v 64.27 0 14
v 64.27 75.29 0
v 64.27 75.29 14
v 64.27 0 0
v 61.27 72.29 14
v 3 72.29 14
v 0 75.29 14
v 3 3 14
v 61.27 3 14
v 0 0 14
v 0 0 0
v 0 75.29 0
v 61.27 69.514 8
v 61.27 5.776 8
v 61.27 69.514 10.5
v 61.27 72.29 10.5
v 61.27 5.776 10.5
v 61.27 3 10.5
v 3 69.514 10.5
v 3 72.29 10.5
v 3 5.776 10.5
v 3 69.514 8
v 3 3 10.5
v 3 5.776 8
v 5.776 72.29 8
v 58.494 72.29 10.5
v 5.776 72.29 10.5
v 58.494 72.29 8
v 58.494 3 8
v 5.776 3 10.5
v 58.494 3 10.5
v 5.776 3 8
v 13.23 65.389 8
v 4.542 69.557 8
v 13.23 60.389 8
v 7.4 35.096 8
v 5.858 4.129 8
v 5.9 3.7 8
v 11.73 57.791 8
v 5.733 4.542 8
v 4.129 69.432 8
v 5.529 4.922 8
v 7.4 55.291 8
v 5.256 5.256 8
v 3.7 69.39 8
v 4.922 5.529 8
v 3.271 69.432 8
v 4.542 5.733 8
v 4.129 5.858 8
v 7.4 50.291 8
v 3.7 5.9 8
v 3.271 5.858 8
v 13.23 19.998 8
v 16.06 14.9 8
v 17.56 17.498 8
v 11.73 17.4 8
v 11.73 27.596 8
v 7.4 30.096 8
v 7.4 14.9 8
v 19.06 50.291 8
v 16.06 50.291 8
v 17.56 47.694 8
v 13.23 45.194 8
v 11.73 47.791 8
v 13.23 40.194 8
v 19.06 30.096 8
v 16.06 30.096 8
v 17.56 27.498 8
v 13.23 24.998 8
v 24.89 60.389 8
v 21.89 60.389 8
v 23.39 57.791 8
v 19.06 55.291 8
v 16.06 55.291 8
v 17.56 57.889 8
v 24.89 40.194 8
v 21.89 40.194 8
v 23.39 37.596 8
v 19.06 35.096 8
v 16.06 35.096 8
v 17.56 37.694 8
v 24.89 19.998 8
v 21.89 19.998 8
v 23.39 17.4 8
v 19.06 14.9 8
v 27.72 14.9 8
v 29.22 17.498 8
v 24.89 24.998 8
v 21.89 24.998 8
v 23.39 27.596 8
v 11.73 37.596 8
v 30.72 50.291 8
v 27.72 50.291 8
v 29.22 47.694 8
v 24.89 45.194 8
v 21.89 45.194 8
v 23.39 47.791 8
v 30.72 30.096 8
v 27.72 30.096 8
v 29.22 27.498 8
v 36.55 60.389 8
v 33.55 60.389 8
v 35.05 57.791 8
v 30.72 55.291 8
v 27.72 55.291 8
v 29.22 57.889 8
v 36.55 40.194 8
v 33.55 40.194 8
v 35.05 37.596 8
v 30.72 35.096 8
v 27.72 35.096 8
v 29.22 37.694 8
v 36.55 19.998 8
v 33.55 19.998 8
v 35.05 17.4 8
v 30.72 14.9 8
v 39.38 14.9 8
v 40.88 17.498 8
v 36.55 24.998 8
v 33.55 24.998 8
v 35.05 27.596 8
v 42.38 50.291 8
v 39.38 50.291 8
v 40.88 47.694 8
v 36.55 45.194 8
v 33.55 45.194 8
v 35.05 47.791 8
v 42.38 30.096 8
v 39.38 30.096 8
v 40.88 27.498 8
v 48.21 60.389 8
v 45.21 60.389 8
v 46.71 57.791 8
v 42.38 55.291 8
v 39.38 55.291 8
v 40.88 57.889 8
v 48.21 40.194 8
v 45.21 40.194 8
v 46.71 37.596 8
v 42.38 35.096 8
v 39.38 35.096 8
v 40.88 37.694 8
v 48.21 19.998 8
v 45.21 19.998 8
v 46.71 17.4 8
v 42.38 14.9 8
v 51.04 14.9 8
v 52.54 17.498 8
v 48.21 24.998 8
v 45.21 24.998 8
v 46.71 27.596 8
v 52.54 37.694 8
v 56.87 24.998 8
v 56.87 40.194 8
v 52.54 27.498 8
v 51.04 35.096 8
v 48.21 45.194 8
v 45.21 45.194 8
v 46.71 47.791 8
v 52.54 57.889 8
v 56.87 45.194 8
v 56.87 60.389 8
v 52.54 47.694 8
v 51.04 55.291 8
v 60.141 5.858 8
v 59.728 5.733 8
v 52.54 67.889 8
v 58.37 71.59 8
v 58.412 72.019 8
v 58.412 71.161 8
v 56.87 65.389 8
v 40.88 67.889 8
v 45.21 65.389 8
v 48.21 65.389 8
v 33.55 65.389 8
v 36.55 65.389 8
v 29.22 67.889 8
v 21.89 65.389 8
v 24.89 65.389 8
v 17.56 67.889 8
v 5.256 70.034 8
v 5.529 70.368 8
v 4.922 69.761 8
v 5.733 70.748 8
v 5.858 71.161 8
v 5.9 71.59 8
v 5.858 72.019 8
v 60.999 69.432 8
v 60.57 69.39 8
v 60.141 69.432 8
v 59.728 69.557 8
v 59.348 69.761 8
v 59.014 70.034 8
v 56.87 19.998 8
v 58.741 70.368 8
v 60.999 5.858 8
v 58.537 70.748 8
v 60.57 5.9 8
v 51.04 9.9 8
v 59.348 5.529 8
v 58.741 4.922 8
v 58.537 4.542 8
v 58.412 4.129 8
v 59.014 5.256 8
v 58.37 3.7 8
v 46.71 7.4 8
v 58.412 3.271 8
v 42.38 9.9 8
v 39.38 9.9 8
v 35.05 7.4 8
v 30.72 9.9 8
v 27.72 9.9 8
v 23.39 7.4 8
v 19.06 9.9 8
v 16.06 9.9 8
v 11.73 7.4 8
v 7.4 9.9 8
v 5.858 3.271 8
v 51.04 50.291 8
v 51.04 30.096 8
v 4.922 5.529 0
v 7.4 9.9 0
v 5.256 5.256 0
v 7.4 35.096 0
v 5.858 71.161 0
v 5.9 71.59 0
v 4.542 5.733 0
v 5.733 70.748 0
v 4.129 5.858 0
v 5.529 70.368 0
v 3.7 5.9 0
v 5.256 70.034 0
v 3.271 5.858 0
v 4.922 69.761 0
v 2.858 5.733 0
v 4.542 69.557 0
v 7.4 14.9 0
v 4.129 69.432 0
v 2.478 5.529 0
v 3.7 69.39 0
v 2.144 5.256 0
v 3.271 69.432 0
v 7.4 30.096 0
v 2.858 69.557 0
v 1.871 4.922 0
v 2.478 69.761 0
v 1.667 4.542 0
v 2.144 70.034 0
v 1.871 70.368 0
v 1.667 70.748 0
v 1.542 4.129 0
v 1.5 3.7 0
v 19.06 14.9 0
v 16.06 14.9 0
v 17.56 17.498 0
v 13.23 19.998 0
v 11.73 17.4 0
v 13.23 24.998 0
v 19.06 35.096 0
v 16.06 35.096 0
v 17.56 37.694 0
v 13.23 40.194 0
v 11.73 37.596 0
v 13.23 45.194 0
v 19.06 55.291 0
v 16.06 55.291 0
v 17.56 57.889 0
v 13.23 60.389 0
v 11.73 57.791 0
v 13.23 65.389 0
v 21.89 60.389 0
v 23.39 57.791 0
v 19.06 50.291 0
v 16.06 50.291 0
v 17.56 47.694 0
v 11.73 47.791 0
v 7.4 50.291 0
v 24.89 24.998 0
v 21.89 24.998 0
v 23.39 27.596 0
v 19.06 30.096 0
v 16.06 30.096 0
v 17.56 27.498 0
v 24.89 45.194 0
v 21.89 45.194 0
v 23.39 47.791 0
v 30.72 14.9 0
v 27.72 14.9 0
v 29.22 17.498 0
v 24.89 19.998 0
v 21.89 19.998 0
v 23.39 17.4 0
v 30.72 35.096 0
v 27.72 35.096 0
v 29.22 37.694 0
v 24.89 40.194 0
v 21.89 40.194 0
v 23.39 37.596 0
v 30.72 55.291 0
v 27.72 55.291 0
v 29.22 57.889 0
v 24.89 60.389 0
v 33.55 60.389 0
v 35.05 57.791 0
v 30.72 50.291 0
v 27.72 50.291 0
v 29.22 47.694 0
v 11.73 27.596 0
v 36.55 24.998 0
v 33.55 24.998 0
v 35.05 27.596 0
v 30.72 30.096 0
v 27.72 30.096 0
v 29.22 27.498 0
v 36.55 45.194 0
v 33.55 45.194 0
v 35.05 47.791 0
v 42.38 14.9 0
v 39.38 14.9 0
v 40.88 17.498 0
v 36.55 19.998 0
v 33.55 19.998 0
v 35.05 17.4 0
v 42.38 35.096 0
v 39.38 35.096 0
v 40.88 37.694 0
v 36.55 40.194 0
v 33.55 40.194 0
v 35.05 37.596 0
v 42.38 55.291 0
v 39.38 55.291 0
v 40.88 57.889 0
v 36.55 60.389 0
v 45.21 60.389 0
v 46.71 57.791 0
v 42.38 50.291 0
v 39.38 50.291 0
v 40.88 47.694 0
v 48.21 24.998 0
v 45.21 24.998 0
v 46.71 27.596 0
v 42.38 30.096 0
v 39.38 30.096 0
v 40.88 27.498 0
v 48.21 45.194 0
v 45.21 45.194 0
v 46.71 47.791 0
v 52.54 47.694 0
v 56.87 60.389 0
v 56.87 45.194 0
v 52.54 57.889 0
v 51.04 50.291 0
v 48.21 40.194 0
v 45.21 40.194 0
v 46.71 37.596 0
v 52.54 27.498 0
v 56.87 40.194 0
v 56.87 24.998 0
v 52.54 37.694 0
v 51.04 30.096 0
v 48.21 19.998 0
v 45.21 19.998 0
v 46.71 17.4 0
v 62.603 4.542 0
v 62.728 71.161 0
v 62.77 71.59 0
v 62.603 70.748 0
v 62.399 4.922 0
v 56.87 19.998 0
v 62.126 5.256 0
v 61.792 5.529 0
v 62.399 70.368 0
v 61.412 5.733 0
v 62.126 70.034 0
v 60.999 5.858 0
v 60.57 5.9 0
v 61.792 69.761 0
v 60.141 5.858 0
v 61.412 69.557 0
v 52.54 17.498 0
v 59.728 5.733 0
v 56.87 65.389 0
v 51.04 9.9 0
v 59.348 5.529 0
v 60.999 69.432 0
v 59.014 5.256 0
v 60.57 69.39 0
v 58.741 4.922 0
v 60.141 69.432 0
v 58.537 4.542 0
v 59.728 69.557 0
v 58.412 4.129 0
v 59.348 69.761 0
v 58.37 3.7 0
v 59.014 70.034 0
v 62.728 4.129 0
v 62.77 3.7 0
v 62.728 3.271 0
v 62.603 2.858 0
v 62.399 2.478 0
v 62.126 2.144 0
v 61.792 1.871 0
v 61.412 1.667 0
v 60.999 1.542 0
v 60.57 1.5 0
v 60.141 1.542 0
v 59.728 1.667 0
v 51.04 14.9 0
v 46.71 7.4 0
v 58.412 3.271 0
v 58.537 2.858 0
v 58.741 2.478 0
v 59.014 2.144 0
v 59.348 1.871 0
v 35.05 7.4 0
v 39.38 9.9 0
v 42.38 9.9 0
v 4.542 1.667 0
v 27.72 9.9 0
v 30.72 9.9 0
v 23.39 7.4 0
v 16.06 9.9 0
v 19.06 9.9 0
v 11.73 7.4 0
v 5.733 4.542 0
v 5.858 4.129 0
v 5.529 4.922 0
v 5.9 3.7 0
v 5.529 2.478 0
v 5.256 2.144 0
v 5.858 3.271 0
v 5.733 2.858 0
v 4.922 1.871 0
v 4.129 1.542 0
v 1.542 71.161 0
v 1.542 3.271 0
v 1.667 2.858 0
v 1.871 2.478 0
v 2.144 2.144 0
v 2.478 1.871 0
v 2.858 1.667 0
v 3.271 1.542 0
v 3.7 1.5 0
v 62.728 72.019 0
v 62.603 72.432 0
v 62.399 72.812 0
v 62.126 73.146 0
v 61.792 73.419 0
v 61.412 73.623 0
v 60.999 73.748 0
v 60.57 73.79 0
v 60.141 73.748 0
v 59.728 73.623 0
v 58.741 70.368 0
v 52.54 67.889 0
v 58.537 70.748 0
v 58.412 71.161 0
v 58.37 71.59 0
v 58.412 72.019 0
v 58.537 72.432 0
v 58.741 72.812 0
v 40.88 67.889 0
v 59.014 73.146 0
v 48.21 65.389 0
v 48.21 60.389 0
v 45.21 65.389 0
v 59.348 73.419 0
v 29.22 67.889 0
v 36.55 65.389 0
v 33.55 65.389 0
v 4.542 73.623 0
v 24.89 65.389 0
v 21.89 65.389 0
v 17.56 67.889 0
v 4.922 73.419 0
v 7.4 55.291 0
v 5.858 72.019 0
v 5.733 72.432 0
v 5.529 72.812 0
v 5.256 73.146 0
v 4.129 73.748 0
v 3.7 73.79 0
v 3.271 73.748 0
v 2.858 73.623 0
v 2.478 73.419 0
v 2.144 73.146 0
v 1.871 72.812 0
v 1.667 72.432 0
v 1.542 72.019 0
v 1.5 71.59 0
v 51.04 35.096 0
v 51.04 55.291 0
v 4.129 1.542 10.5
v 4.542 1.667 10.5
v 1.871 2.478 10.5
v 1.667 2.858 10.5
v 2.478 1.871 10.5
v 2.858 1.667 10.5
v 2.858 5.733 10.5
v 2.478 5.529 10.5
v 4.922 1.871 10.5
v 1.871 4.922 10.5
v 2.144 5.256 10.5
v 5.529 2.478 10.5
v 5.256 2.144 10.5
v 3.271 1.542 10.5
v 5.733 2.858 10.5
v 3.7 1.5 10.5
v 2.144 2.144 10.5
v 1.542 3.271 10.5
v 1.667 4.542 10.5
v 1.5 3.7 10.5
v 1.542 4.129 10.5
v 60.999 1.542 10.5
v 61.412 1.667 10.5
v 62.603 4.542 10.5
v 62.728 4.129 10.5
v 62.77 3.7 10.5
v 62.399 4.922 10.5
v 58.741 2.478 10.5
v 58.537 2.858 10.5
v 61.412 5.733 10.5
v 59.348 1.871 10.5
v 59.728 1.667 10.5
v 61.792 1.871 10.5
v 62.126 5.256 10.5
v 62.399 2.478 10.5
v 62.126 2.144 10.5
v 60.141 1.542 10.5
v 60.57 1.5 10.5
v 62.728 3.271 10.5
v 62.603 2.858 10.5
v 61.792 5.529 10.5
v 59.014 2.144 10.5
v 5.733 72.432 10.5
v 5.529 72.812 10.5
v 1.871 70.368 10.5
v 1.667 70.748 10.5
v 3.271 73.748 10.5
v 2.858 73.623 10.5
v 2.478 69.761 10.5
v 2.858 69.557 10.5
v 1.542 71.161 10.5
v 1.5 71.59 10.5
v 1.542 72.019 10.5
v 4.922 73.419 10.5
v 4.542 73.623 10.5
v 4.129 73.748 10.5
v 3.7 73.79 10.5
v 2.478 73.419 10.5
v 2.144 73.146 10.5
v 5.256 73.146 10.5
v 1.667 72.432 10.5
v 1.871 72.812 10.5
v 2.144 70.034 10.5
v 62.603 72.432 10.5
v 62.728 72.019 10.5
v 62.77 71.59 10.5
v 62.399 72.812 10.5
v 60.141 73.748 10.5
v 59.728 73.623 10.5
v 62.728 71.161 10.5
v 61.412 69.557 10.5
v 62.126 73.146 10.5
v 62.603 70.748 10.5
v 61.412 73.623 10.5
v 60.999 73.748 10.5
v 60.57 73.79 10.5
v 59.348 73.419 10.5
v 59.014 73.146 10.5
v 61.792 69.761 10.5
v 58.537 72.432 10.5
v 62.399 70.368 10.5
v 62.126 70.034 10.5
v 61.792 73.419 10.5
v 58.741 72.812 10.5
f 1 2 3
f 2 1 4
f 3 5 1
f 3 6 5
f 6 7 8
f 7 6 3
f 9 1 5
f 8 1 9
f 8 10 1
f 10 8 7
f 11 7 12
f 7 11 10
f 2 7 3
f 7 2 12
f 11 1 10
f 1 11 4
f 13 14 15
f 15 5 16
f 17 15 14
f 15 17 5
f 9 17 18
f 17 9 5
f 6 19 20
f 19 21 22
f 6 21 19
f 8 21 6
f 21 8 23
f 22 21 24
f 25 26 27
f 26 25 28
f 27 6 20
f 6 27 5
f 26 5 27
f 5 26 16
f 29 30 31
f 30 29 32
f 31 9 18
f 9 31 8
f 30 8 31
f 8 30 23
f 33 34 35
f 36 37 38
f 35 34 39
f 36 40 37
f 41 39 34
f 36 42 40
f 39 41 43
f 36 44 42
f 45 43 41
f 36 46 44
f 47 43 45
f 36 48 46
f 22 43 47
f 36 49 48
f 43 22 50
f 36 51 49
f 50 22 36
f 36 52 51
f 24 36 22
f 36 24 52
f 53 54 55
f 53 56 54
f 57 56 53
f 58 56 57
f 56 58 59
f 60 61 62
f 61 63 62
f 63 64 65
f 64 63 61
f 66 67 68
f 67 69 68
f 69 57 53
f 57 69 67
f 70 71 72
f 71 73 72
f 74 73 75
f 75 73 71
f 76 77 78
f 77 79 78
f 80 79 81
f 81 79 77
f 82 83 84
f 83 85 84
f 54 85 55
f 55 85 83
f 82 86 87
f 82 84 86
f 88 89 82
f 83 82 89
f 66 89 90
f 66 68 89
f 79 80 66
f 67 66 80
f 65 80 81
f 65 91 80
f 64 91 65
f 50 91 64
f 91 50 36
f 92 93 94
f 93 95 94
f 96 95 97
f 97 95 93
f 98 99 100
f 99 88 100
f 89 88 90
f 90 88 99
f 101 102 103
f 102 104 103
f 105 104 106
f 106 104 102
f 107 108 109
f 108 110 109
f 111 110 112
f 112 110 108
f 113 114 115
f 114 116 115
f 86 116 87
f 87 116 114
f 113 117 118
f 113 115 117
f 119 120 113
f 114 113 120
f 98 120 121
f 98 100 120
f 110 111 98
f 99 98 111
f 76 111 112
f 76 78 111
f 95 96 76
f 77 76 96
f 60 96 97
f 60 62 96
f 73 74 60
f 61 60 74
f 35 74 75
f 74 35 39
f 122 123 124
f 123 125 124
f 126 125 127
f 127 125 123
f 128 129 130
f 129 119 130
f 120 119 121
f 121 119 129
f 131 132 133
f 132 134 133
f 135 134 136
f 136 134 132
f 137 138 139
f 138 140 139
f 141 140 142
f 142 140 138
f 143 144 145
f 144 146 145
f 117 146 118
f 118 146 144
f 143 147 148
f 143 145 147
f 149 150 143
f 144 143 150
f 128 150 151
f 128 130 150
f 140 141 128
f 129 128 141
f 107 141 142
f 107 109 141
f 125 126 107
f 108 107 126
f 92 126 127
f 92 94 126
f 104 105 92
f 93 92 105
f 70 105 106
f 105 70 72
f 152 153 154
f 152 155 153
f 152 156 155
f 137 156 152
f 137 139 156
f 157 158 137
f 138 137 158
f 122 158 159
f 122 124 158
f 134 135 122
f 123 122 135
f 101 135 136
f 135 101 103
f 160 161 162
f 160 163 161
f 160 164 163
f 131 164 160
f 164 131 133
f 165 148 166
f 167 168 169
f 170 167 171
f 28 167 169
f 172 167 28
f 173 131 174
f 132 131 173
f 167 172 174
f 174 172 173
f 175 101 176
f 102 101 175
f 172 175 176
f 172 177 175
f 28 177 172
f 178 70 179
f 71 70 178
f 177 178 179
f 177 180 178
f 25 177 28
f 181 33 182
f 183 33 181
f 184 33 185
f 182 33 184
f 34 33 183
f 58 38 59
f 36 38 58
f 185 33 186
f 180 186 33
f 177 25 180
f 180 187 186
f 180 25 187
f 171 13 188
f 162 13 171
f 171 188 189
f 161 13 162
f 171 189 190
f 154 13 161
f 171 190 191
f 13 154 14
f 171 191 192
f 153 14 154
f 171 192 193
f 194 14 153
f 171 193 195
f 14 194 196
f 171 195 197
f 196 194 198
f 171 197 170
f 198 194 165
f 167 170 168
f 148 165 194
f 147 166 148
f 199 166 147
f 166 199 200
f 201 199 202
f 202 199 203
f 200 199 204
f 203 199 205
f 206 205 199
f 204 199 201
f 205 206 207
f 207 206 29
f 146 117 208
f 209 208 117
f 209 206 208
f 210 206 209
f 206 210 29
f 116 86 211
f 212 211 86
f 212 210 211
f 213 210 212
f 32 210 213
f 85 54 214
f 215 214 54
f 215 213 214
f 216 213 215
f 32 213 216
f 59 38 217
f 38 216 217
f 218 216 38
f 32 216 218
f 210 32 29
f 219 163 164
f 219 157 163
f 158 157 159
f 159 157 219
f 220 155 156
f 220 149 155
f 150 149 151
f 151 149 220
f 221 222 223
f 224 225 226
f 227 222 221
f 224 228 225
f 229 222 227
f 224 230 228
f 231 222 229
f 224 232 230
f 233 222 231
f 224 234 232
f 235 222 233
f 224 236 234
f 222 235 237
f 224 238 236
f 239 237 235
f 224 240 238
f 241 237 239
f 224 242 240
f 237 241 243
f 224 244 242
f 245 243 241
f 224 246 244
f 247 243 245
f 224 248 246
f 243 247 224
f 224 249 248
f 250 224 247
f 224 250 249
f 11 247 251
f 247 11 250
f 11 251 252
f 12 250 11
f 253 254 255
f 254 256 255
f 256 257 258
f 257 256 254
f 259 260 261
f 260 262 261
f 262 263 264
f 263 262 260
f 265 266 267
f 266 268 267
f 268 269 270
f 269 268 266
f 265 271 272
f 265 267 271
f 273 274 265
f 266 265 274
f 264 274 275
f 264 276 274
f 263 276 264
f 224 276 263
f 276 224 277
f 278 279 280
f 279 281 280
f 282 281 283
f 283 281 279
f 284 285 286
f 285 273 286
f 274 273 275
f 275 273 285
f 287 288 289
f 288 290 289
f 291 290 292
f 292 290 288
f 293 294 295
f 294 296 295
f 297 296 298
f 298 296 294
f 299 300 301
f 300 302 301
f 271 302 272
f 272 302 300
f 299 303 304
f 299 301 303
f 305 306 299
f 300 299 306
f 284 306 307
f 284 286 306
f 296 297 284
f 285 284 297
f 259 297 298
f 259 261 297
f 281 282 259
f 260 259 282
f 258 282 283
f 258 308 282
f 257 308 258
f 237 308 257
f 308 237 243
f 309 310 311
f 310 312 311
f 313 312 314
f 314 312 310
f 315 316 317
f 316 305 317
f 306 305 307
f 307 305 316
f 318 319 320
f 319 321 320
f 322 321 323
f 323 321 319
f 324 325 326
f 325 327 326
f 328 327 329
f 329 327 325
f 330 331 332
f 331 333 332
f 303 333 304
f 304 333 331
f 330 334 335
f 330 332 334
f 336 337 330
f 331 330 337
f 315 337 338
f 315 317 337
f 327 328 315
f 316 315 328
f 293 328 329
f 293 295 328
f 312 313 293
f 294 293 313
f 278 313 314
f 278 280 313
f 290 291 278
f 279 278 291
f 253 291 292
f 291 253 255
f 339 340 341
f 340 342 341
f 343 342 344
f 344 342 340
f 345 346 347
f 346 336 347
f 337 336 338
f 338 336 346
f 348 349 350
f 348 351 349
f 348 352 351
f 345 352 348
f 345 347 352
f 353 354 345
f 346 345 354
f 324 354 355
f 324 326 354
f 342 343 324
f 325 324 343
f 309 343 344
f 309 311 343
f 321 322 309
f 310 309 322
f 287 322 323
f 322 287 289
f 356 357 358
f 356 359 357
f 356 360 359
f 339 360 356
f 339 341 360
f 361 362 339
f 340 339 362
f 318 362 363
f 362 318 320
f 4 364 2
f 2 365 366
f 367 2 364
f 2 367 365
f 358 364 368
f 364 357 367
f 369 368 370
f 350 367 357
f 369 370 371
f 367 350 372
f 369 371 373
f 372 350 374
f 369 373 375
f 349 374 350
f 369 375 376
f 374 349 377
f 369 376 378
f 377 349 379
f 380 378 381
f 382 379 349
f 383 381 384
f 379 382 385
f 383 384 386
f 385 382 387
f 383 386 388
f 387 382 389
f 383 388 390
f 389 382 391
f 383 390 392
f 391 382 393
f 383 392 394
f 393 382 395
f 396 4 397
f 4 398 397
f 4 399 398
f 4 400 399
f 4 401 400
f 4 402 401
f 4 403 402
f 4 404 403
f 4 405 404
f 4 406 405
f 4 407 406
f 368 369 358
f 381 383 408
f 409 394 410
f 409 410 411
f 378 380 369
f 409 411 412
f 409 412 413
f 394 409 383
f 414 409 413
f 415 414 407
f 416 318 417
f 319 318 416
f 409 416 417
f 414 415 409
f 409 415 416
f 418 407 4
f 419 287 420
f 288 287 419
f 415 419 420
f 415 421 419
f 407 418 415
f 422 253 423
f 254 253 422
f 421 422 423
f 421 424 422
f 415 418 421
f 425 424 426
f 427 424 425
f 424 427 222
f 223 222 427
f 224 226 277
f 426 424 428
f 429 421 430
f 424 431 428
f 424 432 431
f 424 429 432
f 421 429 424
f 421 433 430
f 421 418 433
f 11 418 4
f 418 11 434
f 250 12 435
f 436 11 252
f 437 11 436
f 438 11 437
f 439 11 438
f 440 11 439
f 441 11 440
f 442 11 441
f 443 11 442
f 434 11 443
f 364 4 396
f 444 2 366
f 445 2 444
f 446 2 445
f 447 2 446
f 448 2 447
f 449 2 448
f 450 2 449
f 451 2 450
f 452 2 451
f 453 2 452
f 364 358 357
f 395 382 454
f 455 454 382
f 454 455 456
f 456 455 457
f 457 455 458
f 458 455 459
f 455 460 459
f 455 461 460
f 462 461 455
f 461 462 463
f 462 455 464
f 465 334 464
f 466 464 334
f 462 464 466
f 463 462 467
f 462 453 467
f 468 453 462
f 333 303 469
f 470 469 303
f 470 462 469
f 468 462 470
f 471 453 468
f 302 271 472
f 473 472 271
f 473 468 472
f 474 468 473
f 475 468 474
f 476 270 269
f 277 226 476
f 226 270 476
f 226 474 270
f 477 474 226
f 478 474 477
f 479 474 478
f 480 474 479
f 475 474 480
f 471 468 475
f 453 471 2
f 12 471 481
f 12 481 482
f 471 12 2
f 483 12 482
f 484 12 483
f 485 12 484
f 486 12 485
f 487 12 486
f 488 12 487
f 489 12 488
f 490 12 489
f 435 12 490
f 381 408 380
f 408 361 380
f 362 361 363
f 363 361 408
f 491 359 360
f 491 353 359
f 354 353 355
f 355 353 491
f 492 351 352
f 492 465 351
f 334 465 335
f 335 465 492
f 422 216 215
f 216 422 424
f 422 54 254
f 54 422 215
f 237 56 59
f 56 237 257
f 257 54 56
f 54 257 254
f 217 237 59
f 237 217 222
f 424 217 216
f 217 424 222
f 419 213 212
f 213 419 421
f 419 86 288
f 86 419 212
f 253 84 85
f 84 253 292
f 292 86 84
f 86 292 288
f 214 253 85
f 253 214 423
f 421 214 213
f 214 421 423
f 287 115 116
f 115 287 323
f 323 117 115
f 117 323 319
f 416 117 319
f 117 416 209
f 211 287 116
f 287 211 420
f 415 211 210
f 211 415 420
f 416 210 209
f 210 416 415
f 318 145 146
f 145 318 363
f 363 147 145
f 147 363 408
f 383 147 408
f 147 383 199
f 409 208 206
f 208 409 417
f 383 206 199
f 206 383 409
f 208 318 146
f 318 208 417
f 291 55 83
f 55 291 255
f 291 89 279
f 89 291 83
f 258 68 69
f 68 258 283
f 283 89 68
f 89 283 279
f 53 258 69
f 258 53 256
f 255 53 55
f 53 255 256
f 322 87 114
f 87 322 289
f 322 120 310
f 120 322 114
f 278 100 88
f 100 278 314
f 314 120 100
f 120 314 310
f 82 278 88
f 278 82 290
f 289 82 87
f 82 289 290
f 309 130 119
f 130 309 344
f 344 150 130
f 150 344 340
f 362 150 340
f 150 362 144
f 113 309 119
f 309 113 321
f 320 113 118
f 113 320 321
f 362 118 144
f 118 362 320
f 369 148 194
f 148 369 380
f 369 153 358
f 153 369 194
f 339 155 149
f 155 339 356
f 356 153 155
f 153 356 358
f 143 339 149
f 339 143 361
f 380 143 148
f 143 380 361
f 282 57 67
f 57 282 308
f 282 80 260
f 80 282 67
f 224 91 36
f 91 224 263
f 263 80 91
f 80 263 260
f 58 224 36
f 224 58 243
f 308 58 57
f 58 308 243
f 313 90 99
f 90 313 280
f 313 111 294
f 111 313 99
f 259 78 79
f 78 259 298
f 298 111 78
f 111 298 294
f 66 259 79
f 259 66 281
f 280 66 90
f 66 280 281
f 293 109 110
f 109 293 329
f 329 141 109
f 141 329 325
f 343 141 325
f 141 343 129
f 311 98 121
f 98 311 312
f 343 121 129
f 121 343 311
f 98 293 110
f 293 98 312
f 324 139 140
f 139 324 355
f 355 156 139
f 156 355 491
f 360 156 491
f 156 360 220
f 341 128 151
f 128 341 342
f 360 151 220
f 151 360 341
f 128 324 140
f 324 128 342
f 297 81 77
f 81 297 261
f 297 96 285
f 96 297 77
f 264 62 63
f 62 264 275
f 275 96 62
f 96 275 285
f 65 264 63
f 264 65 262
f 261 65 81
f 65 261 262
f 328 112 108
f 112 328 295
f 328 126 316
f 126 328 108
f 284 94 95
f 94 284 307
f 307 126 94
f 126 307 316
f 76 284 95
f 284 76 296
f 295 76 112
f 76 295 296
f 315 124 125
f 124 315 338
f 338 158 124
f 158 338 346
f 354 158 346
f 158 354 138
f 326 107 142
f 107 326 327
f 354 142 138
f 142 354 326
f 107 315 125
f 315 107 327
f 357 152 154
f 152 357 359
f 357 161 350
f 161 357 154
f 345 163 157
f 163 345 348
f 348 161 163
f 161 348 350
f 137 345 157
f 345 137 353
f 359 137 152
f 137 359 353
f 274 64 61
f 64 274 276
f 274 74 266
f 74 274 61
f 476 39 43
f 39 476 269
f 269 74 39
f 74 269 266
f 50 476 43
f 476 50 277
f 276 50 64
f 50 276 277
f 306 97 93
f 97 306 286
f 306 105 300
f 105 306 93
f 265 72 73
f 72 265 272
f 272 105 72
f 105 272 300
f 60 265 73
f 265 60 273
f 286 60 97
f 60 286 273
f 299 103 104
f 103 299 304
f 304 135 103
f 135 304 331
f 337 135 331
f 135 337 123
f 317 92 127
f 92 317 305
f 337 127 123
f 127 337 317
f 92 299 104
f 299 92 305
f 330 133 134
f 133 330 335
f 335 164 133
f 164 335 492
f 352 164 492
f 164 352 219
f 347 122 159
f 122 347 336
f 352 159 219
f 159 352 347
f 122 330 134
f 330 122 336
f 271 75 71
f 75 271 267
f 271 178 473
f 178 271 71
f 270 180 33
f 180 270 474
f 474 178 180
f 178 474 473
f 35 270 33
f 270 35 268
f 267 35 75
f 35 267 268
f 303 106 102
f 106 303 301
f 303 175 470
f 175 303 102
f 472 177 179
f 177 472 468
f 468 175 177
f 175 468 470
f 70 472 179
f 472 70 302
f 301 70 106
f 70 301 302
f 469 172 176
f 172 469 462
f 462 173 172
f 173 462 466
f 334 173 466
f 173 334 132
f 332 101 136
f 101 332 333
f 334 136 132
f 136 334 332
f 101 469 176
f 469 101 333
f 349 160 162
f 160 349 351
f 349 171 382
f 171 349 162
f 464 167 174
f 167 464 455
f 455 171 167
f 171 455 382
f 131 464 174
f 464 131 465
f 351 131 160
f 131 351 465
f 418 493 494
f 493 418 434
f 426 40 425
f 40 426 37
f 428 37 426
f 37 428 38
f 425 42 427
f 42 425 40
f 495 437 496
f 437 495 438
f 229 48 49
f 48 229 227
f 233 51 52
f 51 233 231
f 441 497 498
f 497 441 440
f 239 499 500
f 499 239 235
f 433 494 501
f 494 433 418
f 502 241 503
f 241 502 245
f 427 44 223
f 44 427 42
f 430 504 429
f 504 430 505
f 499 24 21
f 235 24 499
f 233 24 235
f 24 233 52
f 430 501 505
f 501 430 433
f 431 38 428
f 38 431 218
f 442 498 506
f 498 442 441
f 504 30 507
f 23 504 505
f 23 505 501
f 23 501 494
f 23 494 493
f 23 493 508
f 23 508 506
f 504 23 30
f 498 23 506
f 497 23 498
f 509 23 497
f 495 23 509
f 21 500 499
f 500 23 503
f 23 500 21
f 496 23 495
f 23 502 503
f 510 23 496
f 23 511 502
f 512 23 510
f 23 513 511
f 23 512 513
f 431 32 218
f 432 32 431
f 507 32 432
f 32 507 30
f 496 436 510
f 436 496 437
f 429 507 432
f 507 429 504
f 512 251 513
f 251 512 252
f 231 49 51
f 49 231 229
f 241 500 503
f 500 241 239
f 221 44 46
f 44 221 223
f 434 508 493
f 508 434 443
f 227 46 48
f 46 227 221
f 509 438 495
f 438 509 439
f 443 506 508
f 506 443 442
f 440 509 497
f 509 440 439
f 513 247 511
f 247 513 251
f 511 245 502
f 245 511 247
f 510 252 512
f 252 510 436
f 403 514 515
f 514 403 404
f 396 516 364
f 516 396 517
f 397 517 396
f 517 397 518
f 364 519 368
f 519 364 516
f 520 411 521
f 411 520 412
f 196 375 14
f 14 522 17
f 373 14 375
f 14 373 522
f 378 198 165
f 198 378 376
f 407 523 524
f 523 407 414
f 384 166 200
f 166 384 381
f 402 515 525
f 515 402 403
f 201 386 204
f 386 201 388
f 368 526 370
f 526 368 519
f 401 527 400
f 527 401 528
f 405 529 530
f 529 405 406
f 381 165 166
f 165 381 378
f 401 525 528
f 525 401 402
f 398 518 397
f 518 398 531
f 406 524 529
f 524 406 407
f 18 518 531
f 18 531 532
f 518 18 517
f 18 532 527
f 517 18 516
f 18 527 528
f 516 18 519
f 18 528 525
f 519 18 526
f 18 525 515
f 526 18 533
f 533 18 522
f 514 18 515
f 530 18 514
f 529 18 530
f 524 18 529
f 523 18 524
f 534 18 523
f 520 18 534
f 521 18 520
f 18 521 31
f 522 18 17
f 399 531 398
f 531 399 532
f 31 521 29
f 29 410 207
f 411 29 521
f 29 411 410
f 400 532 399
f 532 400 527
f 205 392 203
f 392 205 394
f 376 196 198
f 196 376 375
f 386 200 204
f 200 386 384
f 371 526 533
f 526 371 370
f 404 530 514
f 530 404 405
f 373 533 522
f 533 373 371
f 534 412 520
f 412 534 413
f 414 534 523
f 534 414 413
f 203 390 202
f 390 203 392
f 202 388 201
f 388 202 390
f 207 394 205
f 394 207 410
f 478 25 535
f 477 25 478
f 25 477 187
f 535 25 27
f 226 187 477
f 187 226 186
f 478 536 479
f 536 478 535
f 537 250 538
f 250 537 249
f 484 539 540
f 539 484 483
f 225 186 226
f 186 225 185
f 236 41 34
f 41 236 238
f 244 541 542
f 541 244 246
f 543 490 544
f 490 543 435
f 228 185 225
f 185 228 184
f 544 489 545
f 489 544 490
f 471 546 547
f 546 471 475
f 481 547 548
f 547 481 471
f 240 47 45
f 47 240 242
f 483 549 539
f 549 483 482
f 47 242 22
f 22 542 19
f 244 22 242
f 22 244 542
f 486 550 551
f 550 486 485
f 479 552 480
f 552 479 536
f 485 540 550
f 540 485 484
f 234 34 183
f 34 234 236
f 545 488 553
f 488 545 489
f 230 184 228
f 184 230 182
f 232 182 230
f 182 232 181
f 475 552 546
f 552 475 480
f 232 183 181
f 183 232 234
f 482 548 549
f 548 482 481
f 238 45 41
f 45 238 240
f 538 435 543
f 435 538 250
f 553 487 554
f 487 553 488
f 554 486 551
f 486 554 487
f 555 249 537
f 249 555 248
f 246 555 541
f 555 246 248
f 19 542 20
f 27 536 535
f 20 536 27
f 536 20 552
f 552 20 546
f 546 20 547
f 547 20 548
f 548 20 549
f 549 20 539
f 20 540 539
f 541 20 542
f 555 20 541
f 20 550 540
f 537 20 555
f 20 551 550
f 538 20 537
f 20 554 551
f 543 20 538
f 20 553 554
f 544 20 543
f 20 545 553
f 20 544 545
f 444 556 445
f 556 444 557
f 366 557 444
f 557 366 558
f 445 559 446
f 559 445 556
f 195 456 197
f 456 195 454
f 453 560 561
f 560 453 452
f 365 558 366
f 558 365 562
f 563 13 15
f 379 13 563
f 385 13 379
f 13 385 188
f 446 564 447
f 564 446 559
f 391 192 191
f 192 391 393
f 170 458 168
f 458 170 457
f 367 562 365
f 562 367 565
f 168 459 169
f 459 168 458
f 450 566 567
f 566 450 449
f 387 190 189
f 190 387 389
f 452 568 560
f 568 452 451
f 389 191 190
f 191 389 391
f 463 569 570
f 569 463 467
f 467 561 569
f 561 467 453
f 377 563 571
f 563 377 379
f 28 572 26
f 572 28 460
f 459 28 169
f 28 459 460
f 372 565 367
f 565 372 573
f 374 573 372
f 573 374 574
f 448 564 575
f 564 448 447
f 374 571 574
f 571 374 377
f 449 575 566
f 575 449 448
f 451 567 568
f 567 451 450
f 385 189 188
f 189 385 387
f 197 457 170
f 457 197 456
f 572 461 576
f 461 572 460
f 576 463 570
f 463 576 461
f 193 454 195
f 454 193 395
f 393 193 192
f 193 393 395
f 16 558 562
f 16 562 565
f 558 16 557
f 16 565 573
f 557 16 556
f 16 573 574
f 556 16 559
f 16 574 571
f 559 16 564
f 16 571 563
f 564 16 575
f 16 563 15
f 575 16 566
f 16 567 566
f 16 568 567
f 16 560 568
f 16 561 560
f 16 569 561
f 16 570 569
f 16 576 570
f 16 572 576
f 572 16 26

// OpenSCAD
$fn = 32;

// ----------------------------------------------------------------------
// Honeycomb panel: 64.27 x 75.29 mm, 24 cells of 10 mm
// ----------------------------------------------------------------------

// --- parameters (mm) ---
panel_w = 64.27;          // panel width
panel_d = 75.29;          // panel depth
thick = 8;                // panel thickness
cell_r = 5;               // hex cell circumradius
pitch = 11.66;            // hex cell pitch (centre to centre)
web = 3;                  // web between the cells
columns = 4;              // columns of cells
rows = 6;                 // rows of cells
cell_count = 24;          // total cells
shift_x = 11.73;          // first cell offset in x
shift_y = 12.4;           // first cell offset in y
mount_d = 4.4;            // corner mounting holes
hole_off = 3.7;           // mounting hole offset from the corners
rim_h = 14;               // rim height
rim_t = 3;                // rim wall thickness

difference() {
  union() {
    cube([panel_w, panel_d, thick]);
    /* rim around the panel, sunk 1 mm into the plate */
    translate([0, 0, thick - 1]) difference() {
      cube([panel_w, panel_d, rim_h - thick + 1]);
      translate([rim_t, rim_t, -2.5]) cube([panel_w - 2 * rim_t, panel_d - 2 * rim_t, rim_h - thick + 6]);
    }
  }
  /* hexagonal cells, point-up, cut right through the plate */
  for (row = [0 : rows - 1]) {
    for (col = [0 : columns - 1]) {
      translate([shift_x + col * pitch + (row % 2) * pitch / 2, shift_y + row * pitch * 0.866025, -2.5]) rotate([0, 0, 30]) cylinder(h = thick + 5, d = 2 * cell_r, $fn = 6);
    }
  }
  /* corner mounting holes, clear of the outer cell web */
  translate([3.7, 3.7, -2.5]) cylinder(h = thick + 5, d = mount_d);
  translate([60.57, 3.7, -2.5]) cylinder(h = thick + 5, d = mount_d);
  translate([3.7, 71.59, -2.5]) cylinder(h = thick + 5, d = mount_d);
  translate([60.57, 71.59, -2.5]) cylinder(h = thick + 5, d = mount_d);
}
